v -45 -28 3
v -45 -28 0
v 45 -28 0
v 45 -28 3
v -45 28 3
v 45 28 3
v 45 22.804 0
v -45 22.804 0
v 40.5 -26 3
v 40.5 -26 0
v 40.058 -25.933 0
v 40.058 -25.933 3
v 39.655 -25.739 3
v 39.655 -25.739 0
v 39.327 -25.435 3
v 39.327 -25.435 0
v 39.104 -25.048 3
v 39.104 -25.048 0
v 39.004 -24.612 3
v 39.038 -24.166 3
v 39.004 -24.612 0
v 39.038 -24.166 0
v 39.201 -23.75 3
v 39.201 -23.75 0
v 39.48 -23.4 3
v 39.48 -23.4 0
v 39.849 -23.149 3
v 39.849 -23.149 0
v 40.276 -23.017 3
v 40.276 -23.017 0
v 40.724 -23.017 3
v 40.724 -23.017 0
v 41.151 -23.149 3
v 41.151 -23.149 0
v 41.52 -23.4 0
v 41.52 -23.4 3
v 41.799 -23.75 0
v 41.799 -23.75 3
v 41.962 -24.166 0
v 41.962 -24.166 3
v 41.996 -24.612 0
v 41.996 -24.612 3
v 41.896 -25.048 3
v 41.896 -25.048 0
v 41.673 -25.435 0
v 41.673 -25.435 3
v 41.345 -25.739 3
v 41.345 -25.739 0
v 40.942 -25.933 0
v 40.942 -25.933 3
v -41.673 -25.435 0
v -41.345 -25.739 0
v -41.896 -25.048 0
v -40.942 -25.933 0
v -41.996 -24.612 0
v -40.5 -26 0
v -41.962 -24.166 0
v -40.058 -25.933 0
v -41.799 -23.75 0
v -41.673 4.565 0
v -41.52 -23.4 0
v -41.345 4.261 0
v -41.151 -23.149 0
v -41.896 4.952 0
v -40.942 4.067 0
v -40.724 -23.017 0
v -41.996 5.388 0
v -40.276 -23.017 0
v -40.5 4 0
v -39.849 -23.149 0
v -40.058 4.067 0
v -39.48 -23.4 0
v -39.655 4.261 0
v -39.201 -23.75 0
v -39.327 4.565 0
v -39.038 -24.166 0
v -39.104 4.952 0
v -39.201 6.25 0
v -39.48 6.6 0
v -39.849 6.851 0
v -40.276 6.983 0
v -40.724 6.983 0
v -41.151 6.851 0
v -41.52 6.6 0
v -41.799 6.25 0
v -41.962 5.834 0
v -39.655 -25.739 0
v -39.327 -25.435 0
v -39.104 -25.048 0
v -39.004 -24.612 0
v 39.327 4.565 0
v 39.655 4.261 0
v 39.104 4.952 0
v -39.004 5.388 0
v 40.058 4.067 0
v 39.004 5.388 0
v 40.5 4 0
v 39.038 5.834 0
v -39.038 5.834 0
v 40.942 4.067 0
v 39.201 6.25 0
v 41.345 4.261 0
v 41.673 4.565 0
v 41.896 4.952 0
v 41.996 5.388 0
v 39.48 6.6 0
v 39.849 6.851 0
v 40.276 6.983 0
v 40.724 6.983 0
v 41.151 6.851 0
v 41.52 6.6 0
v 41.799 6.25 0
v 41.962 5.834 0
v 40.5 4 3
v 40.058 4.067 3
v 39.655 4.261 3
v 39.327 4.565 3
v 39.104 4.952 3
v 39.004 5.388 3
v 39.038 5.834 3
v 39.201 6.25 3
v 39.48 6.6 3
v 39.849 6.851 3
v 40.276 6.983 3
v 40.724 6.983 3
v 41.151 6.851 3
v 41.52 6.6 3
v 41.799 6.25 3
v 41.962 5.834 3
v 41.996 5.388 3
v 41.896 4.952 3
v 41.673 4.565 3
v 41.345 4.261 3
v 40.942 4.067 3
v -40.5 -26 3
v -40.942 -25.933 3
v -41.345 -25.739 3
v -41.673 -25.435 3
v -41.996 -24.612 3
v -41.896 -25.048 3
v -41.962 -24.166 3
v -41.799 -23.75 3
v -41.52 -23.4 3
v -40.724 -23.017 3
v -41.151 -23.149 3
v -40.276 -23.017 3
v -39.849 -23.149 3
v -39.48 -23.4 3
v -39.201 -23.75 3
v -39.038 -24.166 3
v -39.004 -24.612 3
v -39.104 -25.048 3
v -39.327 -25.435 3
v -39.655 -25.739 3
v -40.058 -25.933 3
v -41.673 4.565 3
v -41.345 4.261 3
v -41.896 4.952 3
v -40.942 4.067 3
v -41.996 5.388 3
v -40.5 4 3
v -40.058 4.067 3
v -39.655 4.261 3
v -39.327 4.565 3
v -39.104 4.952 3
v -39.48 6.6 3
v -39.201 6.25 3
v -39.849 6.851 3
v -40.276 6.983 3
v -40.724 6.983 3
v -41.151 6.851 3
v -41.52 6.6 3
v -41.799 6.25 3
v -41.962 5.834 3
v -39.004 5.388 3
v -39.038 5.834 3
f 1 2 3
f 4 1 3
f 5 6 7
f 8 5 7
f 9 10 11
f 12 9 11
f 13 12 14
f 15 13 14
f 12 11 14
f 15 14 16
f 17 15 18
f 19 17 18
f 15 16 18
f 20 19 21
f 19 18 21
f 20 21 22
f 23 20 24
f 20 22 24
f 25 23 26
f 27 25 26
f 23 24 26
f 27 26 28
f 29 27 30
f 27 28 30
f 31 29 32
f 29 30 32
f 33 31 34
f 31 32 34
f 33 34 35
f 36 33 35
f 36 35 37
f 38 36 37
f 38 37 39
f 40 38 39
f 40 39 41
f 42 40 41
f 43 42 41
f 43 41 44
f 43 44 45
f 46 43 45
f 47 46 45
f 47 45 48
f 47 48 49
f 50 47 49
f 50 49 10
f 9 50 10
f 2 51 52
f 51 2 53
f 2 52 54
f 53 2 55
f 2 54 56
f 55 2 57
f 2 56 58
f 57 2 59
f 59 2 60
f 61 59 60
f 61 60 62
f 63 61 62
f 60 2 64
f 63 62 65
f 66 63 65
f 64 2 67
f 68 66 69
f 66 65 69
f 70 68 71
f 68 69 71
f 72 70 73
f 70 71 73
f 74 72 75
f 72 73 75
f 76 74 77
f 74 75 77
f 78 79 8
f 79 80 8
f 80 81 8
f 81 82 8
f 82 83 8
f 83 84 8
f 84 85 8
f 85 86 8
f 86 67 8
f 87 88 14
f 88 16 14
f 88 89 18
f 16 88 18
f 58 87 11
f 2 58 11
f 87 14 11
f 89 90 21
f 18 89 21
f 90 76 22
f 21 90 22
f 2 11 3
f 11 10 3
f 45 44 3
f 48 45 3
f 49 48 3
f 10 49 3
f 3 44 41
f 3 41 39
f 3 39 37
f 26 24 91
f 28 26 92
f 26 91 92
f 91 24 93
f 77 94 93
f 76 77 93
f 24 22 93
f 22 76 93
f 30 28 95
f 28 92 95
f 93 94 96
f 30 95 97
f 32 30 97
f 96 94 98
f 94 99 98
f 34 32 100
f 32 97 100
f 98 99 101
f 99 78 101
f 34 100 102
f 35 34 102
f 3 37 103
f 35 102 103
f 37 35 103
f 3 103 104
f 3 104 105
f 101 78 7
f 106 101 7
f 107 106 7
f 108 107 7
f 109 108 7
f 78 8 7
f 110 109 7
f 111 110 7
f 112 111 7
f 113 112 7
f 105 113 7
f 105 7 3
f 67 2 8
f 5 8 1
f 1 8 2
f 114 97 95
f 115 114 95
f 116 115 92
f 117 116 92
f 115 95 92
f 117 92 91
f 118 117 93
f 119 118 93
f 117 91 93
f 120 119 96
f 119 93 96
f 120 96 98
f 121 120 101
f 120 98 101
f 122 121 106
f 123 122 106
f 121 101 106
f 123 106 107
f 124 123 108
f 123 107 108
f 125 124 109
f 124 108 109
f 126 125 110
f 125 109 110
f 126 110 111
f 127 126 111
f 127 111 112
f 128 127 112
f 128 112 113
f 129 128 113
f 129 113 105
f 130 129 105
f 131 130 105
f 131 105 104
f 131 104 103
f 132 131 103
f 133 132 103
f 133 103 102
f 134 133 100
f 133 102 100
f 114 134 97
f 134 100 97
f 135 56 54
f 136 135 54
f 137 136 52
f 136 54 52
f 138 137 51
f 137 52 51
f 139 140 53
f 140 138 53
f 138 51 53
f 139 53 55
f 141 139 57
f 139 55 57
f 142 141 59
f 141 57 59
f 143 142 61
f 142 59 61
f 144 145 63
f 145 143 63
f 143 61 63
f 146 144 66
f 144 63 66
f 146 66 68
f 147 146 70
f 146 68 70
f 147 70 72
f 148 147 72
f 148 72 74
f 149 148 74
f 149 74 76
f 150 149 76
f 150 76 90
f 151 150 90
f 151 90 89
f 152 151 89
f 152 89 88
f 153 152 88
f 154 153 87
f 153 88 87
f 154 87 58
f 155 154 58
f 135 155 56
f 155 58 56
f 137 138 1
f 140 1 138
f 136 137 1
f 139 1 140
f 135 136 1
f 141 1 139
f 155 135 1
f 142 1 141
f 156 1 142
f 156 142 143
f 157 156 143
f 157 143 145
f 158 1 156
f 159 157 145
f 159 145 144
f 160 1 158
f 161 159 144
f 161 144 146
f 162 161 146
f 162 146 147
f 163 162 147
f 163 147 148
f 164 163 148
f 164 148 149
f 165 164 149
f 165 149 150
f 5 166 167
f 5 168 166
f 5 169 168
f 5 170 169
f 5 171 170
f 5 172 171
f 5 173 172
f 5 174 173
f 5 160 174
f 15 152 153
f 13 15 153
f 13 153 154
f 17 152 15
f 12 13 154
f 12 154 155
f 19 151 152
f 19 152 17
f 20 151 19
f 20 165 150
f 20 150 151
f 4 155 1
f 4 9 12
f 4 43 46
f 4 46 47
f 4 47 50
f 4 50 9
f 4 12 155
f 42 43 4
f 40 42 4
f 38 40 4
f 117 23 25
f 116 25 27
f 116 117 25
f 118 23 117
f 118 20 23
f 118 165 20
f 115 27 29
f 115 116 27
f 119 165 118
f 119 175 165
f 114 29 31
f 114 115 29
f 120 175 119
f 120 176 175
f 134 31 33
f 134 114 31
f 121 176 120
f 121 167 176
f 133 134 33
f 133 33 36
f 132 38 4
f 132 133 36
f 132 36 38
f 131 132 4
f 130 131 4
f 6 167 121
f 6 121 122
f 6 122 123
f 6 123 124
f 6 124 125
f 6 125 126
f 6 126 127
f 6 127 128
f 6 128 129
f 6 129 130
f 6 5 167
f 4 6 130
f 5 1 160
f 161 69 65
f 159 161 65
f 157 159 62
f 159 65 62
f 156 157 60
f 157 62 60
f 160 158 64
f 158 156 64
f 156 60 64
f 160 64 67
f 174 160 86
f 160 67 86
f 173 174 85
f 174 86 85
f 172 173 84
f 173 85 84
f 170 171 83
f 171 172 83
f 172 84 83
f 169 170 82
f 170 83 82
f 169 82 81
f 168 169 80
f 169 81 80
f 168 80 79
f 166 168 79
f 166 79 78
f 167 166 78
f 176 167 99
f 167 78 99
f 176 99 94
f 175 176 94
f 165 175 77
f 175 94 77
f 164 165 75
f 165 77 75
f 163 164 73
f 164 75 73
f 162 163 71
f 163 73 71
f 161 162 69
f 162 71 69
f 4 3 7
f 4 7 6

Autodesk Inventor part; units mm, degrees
ref_plane "YZ Plane" through (0, 0, 0) normal (1, 0, 0) x (0, 1, 0)
ref_plane "XZ Plane" through (0, 0, 0) normal (0, 1, 0) x (-1, 0, 0)
ref_plane "XY Plane" through (0, 0, 0) normal (0, 0, 1) x (1, 0, 0)
sketch "Szkic1" plane through (0, 0, 0) normal (0, 0, 1) x (1, 0, 0)
  line L0 (0, -39.2) -> (0, 39.2) projected
  line L1 (-63, 0) -> (63, 0) projected
  line L2 (-45, -28) -> (45, -28)
  line L3 (45, -28) -> (45, 28)
  line L4 (45, 28) -> (-45, 28)
  line L5 (-45, 28) -> (-45, -28)
  line L6 (-45, -28) -> (45, 28) construction
  line L7 (45, -28) -> (-45, 28) construction
  point P0 (0, 0)
  dimension "d0" = 90
  dimension "d1" = 56
extrude "Wyciągnięcie proste1" add sketch "Szkic1" along normal blind 3
sketch "Szkic2" plane through (45, -28, 0) normal (1, 0, 0) x (0, 0, -1)
  line L0 (-3, 0) -> (-3, 56) projected
  line L1 (-3, 56) -> (0, 50.8038)
  line L2 (0, 0) -> (0, 56) projected
  line L3 (0, 0) -> (0, 56) projected
  line L4 (0, 56) -> (-3, 56) projected
  line L5 (-3, 0) -> (-3, 56) projected
  line L6 (0, 0) -> (-3, 0) projected
  point P0 (0, 28)
  dimension "d4" = 30
extrude "Wyciągnięcie proste2" cut sketch "Szkic2" against normal blind 90 contours L4 L2 L1
sketch "Szkic3" plane through (0, 0, 3) normal (0, 0, 1) x (1, 0, 0)
  line L0 (-45, -28) -> (45, -28) projected
  line L1 (45, -28) -> (45, 28) projected
  line L2 (45, 28) -> (-45, 28) projected
  line L3 (-45, 28) -> (-45, -28) projected
  point P0 (0, 0)
  point P1 (40.5, 5.5)
  point P2 (40.5, -24.5)
  dimension "d7" = 4.5
  dimension "d8" = 4.5
  dimension "d9" = 3.5
  dimension "d10" = 30
hole "Otwór1" at (40.5, 5.5, 3) at (40.5, -24.5, 3) direction (0, 0, -1) diameter 3 depth 3
mirror "Odbij1" about plane through (0, 0, 0) normal (1, 0, 0) of "Otwór1"
properties part number "obciążenie_dół" material "Stal"
